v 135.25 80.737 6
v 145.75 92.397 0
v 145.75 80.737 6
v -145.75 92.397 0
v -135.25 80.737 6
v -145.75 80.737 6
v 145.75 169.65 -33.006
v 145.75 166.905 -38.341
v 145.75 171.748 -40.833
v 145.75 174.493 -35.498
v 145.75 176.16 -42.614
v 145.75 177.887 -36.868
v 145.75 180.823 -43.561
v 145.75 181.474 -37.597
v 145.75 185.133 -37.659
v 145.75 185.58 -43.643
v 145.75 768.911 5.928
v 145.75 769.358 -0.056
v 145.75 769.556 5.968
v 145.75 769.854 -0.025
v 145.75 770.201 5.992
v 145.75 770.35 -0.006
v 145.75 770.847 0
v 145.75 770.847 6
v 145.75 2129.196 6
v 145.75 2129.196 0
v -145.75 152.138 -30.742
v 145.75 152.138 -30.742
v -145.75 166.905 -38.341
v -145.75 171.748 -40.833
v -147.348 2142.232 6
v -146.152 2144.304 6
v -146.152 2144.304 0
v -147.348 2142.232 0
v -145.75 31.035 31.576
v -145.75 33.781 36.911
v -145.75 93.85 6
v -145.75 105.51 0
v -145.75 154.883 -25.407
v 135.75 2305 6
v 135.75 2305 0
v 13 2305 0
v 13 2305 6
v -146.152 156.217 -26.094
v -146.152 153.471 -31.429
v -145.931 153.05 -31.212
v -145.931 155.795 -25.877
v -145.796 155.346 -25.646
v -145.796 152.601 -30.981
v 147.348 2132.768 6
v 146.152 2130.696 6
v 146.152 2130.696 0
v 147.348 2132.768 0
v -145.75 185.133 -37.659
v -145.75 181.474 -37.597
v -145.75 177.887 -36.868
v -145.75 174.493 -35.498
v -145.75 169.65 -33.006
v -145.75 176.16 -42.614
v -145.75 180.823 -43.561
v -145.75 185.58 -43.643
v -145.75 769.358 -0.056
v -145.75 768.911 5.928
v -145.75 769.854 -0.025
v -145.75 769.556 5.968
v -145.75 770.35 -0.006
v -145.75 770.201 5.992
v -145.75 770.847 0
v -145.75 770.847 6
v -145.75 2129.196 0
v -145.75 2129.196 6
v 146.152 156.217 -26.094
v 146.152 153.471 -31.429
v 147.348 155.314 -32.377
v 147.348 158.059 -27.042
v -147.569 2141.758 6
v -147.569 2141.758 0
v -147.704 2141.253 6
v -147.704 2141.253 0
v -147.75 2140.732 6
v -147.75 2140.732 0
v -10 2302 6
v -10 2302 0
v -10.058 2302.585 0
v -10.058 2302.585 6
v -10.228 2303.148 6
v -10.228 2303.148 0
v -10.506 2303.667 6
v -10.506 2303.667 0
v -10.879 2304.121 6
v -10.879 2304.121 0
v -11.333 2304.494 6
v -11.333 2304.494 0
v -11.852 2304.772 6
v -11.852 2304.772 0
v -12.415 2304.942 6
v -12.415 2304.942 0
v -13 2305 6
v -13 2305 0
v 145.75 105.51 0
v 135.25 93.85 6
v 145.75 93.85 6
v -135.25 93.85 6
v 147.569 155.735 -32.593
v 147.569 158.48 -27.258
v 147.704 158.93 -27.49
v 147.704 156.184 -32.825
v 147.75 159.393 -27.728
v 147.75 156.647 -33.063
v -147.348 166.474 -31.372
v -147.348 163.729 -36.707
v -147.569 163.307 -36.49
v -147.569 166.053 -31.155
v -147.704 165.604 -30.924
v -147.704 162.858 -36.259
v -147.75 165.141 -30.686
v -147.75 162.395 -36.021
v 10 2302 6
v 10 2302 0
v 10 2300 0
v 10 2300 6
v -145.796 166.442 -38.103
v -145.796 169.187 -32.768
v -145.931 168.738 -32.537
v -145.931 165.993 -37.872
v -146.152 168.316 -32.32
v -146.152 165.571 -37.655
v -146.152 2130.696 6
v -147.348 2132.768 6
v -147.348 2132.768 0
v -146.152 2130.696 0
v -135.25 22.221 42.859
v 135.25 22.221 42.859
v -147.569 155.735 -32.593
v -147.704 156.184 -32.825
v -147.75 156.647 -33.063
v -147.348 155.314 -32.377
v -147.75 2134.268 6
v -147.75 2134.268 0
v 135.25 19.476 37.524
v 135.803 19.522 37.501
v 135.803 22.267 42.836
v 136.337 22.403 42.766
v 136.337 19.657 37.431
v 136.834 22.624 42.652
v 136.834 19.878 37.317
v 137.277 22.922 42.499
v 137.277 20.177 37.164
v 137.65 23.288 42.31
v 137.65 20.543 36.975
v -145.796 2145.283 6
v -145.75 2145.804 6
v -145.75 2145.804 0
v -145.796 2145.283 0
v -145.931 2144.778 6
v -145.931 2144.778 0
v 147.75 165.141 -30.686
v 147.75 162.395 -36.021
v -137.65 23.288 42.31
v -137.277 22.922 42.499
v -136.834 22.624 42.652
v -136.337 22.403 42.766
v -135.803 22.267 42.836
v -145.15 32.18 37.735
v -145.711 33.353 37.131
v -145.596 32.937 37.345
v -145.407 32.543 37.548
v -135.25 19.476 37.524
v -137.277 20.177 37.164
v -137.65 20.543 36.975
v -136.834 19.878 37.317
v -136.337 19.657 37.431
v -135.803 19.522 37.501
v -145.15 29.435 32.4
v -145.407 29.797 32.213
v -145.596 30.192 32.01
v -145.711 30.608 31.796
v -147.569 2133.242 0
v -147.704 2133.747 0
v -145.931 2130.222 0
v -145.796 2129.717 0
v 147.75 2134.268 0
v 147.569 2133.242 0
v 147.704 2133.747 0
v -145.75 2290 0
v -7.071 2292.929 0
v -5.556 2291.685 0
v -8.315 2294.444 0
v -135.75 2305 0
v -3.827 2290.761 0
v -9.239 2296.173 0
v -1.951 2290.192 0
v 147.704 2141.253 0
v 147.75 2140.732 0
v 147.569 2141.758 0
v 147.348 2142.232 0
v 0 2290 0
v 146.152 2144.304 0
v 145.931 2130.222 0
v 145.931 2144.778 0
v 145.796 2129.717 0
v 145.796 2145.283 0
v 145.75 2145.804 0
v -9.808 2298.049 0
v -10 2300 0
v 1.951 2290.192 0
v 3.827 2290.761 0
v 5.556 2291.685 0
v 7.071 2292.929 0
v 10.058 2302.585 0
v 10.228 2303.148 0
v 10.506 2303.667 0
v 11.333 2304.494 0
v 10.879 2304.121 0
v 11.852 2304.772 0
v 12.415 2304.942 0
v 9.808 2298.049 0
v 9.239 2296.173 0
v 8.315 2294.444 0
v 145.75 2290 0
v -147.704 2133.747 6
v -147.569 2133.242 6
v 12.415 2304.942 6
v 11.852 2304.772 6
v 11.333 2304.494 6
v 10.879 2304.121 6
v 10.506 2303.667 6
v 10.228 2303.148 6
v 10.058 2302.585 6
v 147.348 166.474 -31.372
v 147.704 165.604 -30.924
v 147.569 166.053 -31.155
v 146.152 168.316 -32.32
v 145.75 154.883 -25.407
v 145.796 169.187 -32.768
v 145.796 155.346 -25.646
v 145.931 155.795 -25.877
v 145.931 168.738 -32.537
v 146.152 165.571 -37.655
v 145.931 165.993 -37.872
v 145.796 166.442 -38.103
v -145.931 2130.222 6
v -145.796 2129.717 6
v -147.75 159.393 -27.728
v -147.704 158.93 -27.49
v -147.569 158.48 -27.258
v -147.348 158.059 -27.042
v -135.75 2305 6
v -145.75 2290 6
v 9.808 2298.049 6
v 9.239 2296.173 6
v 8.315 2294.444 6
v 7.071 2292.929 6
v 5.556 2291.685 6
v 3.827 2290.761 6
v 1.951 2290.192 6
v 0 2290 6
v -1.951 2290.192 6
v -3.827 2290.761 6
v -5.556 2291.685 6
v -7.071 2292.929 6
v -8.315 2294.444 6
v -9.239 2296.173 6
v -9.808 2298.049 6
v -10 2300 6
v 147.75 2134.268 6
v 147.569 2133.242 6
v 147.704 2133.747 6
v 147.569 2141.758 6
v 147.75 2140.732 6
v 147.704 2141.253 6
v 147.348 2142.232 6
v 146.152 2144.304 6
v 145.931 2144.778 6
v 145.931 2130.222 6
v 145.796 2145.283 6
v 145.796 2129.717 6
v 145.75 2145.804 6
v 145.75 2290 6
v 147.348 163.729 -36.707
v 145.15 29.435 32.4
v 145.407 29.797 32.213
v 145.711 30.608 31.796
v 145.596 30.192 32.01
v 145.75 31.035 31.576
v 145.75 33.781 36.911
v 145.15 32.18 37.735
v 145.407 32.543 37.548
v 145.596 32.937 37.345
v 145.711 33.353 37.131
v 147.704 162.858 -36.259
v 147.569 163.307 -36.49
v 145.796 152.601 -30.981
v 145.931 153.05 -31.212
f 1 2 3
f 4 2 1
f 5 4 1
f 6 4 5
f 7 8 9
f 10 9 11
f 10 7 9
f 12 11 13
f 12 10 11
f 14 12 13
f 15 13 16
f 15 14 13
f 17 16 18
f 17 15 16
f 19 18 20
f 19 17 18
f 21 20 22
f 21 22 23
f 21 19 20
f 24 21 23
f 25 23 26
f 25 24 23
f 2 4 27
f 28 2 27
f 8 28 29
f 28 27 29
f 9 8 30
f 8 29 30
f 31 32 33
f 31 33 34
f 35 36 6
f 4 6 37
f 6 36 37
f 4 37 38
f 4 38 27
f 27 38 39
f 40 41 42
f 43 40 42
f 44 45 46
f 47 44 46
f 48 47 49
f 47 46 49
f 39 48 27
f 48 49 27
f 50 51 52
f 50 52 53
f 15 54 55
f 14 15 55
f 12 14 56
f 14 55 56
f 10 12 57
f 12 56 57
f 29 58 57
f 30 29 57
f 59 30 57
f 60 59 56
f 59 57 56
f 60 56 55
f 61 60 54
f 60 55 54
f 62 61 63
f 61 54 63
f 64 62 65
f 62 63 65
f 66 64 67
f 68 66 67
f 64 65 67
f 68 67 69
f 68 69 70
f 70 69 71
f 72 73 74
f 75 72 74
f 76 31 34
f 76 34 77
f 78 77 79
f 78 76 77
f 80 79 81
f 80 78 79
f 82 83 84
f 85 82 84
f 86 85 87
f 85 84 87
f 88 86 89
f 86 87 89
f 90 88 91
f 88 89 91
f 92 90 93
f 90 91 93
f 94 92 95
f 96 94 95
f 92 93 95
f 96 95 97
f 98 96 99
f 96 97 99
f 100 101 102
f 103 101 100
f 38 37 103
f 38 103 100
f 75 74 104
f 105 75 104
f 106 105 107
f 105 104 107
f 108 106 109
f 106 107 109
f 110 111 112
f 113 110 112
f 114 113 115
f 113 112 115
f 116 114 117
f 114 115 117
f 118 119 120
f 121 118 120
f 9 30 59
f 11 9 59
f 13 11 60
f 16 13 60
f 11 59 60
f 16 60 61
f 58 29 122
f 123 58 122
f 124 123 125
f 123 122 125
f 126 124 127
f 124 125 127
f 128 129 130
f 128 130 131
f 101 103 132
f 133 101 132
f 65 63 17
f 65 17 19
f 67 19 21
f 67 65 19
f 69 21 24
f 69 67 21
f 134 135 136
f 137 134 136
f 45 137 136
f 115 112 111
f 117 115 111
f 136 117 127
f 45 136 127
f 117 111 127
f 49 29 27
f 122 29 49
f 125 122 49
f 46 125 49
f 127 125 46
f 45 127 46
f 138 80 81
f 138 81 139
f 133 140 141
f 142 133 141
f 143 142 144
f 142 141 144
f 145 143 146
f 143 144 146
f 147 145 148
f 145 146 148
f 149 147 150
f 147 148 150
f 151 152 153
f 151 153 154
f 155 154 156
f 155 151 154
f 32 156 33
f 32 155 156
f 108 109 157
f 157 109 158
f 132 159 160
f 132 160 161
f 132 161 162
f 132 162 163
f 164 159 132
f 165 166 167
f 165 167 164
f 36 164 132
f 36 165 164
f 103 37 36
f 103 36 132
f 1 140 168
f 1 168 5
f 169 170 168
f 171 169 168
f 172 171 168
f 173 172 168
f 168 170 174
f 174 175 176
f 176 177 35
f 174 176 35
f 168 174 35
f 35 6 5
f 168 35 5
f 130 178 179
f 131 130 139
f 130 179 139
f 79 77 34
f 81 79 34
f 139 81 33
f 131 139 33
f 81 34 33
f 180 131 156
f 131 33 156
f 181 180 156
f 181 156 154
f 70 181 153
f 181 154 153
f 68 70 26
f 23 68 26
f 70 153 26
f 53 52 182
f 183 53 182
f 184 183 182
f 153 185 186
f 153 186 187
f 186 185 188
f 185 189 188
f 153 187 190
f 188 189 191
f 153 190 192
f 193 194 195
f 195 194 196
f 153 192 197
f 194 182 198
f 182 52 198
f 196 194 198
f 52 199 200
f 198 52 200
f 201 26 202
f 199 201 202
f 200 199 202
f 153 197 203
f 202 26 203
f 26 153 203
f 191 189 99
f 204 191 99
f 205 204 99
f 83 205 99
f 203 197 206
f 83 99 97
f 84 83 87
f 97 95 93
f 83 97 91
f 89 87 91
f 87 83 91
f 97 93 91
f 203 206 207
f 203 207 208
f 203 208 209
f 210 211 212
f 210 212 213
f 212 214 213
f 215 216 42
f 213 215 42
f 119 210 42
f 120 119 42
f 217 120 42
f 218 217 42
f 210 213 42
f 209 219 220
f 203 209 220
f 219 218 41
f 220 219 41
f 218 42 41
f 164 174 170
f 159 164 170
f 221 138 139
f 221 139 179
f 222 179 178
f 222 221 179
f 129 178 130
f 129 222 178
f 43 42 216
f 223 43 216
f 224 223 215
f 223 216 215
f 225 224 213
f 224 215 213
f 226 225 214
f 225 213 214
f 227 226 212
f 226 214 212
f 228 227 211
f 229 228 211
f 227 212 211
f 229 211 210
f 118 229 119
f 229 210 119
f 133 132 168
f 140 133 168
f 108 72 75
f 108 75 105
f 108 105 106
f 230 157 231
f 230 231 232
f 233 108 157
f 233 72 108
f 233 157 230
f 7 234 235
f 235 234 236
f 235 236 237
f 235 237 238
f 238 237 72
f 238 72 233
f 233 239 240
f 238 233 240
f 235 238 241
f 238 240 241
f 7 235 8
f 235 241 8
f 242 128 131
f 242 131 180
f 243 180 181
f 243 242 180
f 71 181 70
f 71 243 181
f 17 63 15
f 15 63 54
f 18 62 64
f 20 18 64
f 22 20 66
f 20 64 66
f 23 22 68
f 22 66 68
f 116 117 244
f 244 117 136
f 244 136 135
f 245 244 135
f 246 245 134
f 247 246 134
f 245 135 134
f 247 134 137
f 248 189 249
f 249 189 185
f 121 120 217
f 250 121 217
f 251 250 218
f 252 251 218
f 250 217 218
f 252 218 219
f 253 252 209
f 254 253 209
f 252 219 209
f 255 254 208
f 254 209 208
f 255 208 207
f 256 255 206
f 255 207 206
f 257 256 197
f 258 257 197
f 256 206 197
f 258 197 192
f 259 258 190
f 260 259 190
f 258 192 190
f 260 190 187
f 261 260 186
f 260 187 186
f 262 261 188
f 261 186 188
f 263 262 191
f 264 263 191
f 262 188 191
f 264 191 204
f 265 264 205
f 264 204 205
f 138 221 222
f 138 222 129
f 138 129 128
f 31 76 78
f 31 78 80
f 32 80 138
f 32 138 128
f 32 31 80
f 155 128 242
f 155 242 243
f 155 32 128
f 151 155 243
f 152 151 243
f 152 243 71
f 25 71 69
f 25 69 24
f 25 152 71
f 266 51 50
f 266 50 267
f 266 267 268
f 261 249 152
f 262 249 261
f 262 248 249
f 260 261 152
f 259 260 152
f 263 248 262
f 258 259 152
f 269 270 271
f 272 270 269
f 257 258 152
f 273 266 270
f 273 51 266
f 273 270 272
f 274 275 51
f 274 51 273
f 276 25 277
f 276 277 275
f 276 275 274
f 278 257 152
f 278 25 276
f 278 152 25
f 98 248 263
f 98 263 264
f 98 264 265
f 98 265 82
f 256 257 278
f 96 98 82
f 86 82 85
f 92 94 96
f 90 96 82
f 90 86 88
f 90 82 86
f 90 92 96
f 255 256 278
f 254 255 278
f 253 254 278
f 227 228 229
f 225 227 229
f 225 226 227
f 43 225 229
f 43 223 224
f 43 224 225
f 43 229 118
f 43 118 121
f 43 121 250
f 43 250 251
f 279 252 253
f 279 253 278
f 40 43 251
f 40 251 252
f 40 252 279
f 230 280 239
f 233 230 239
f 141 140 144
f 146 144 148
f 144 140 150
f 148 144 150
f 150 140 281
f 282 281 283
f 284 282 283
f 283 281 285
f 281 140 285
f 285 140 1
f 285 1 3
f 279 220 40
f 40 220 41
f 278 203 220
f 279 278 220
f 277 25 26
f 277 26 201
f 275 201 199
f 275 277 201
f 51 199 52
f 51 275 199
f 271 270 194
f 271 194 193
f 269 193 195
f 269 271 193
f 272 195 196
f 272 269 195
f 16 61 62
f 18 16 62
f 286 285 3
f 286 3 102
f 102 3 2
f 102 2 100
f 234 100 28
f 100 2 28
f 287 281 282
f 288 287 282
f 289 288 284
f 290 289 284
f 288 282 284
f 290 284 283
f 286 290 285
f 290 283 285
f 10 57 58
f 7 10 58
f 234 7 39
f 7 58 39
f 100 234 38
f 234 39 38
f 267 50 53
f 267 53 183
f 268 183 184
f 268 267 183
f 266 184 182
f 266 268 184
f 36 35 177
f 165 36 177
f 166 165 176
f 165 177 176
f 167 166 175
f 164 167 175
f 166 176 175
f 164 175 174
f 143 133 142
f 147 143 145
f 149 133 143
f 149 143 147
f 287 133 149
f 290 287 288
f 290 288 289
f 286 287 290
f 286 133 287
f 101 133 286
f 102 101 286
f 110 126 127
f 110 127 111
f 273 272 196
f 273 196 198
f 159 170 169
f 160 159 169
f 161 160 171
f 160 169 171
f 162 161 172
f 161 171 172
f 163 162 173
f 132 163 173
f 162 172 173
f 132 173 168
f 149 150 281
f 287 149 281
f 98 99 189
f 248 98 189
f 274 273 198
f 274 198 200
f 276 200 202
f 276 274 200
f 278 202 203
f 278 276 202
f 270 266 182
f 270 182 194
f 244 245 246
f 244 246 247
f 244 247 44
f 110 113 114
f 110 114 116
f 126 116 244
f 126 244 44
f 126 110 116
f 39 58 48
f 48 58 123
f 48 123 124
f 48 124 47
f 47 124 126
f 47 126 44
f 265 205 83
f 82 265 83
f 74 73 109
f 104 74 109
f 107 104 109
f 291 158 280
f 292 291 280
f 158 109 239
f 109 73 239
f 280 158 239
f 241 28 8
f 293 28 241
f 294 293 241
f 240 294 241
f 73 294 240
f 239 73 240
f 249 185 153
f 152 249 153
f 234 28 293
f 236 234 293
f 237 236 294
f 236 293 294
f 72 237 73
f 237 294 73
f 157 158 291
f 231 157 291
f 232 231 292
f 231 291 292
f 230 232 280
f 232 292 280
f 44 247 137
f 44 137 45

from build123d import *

# Parameters (mm, degrees)
EXTRUDE1_DEPTH         = 6
EXTRUDE2_DEPTH         = 6
PROCESS_BENDS1_START   = 42.277322868
PROCESS_BENDS1_DEPTH   = 6
PROCESS_BENDS1_START_2 = -147.75
PROCESS_BENDS1_2_DEPTH = 295.5
PROCESS_BENDS1_START_3 = -135.25
PROCESS_BENDS1_3_DEPTH = 270.5
PROCESS_BENDS1_START_4 = -145.75
PROCESS_BENDS1_4_DEPTH = 291.5
PROCESS_BENDS1_5_DEPTH = 6


with BuildPart() as part:
    # Sketch1 → Extrude1 (new body)
    with BuildSketch(Plane.XY):
        with BuildLine():
            Line((-135.25, 0), (135.25, 0))
            ThreePointArc((135.25, 0), (136.591640787, 0.316718427), (137.65, 1.2))
            Line((137.65, 1.2), (145.15, 11.2))
            ThreePointArc((145.15, 11.2), (145.596049894, 12.051316702), (145.75, 13))
            Line((145.75, 13), (145.75, 2290))
            Line((145.75, 2290), (135.75, 2305))
            Line((135.75, 2305), (13, 2305))
            ThreePointArc((13, 2305), (10.878679656, 2304.121320344), (10, 2302))
            Line((10, 2302), (10, 2300))
            ThreePointArc((10, 2300), (0, 2290), (-10, 2300))
            Line((-10, 2300), (-10, 2302))
            ThreePointArc((-10, 2302), (-10.878679656, 2304.121320344), (-13, 2305))
            Line((-13, 2305), (-135.75, 2305))
            Line((-135.75, 2305), (-145.75, 2290))
            Line((-145.75, 2290), (-145.75, 13))
            ThreePointArc((-145.75, 13), (-145.596049894, 12.051316702), (-145.15, 11.2))
            Line((-145.15, 11.2), (-137.65, 1.2))
            ThreePointArc((-137.65, 1.2), (-136.591640787, 0.316718427), (-135.25, 0))
        make_face()
    extrude(amount=EXTRUDE1_DEPTH)

    # Sketch3 → Extrude2 (add)
    with BuildSketch(Plane.XY.offset(6)):
        with BuildLine():
            Line((147.348076211, 2142.232050808), (146.151923789, 2144.303847577))
            ThreePointArc((146.151923789, 2144.303847577), (145.852222521, 2145.027390442), (145.75, 2145.803847577))
            Line((145.75, 2145.803847577), (145.75, 2129.196152423))
            ThreePointArc((145.75, 2129.196152423), (145.852222521, 2129.972609558), (146.151923789, 2130.696152423))
            Line((146.151923789, 2130.696152423), (147.348076211, 2132.767949192))
            ThreePointArc((147.348076211, 2132.767949192), (147.647777479, 2133.491492057), (147.75, 2134.267949192))
            Line((147.75, 2134.267949192), (147.75, 2140.732050808))
            ThreePointArc((147.75, 2140.732050808), (147.647777479, 2141.508507943), (147.348076211, 2142.232050808))
        make_face()
        with BuildLine():
            Line((-145.75, 2129.196152423), (-145.75, 2145.803847577))
            ThreePointArc((-145.75, 2145.803847577), (-145.852222521, 2145.027390442), (-146.151923789, 2144.303847577))
            Line((-146.151923789, 2144.303847577), (-147.348076211, 2142.232050808))
            ThreePointArc((-147.348076211, 2142.232050808), (-147.647777479, 2141.508507943), (-147.75, 2140.732050808))
            Line((-147.75, 2140.732050808), (-147.75, 2134.267949192))
            ThreePointArc((-147.75, 2134.267949192), (-147.647777479, 2133.491492057), (-147.348076211, 2132.767949192))
            Line((-147.348076211, 2132.767949192), (-146.151923789, 2130.696152423))
            ThreePointArc((-146.151923789, 2130.696152423), (-145.852222521, 2129.972609558), (-145.75, 2129.196152423))
        make_face()
        with BuildLine():
            Line((145.75, 149.196152423), (145.75, 165.803847577))
            ThreePointArc((145.75, 165.803847577), (145.852222521, 165.027390442), (146.151923789, 164.303847577))
            Line((146.151923789, 164.303847577), (147.348076211, 162.232050808))
            ThreePointArc((147.348076211, 162.232050808), (147.647777479, 161.508507943), (147.75, 160.732050808))
            Line((147.75, 160.732050808), (147.75, 154.267949192))
            ThreePointArc((147.75, 154.267949192), (147.647777479, 153.491492057), (147.348076211, 152.767949192))
            Line((147.348076211, 152.767949192), (146.151923789, 150.696152423))
            ThreePointArc((146.151923789, 150.696152423), (145.852222521, 149.972609558), (145.75, 149.196152423))
        make_face()
        with BuildLine():
            Line((-147.348076211, 162.232050808), (-146.151923789, 164.303847577))
            ThreePointArc((-146.151923789, 164.303847577), (-145.852222521, 165.027390442), (-145.75, 165.803847577))
            Line((-145.75, 165.803847577), (-145.75, 149.196152423))
            ThreePointArc((-145.75, 149.196152423), (-145.852222521, 149.972609558), (-146.151923789, 150.696152423))
            Line((-146.151923789, 150.696152423), (-147.348076211, 152.767949192))
            ThreePointArc((-147.348076211, 152.767949192), (-147.647777479, 153.491492057), (-147.75, 154.267949192))
            Line((-147.75, 154.267949192), (-147.75, 160.732050808))
            ThreePointArc((-147.75, 160.732050808), (-147.647777479, 161.508507943), (-147.348076211, 162.232050808))
        make_face()
    extrude(amount=-EXTRUDE2_DEPTH)

    # Process-Bends1 2 outline → Process-Bends1 2 (cut)
    with BuildSketch(Plane.YZ.offset(PROCESS_BENDS1_START_2)):
        Polygon((92.396611983, 0), (80.736895303, 6), (0, 6), (0, 0), align=None)
        with BuildLine():
            Line((770.847206555, 6), (93.849827585, 6))
            Line((93.849827585, 6), (105.509544266, 0))
            Line((105.509544266, 0), (689.517739901, 0))
            Line((689.517739901, 0), (768.911335172, 5.927830646))
            ThreePointArc((768.911335172, 5.927830646), (769.878598478, 5.981951397), (770.847206555, 6))
        make_face()
    extrude(amount=PROCESS_BENDS1_2_DEPTH, mode=Mode.SUBTRACT)

    # Process-Bends1 3 outline → Process-Bends1 3 (add)
    with BuildSketch(Plane.YZ.offset(PROCESS_BENDS1_START_3)):
        Polygon((22.221302391, 42.859484921), (19.475921021, 37.524423428), (80.736895303, 6), (93.849827585, 6), align=None)
        with BuildLine():
            Line((105.509544266, 0), (92.396611983, 0))
            Line((92.396611983, 0), (171.747570561, -40.833389396))
            ThreePointArc((171.747570561, -40.833389396), (178.469550701, -43.194639768), (185.580094549, -43.64262024))
            Line((185.580094549, -43.64262024), (769.358074722, -0.055514888))
            ThreePointArc((769.358074722, -0.055514888), (770.102123419, -0.013883541), (770.847206555, 0))
            Line((770.847206555, 0), (689.517739901, 0))
            Line((689.517739901, 0), (185.133354999, -37.659274706))
            ThreePointArc((185.133354999, -37.659274706), (179.663705885, -37.314674343), (174.492951931, -35.498327904))
            Line((174.492951931, -35.498327904), (105.509544266, 0))
        make_face()
    extrude(amount=PROCESS_BENDS1_3_DEPTH)



with BuildPart() as body_2:
    # Process-Bends1: read off the stored shape, not the designer's step
    # Process-Bends1 outline → Process-Bends1 (new body)
    with BuildSketch(Plane(origin=(0, 0, 0), x_dir=(1, 0, 0), z_dir=(0, 0.457563561703474, 0.889176915468025)).offset(PROCESS_BENDS1_START)):
        with BuildLine():
            ThreePointArc((-145.75, 165.951578122), (-145.852222521, 165.175120987), (-146.151923789, 164.451578122))
            Line((-146.151923789, 164.451578122), (-147.348076211, 162.379781352))
            ThreePointArc((-147.348076211, 162.379781352), (-147.647777479, 161.656238487), (-147.75, 160.879781352))
            Line((-147.75, 160.879781352), (-147.75, 154.415679737))
            ThreePointArc((-147.75, 154.415679737), (-147.647777479, 153.639222602), (-147.348076211, 152.915679737))
            Line((-147.348076211, 152.915679737), (-146.151923789, 150.843882967))
            ThreePointArc((-146.151923789, 150.843882967), (-145.852222521, 150.120340102), (-145.75, 149.343882967))
            Line((-145.75, 149.343882967), (-145.75, 165.951578122))
        make_face()
        with BuildLine():
            Line((145.75, 165.951578122), (145.75, 149.343882967))
            ThreePointArc((145.75, 149.343882967), (145.852222521, 150.120340102), (146.151923789, 150.843882967))
            Line((146.151923789, 150.843882967), (147.348076211, 152.915679737))
            ThreePointArc((147.348076211, 152.915679737), (147.647777479, 153.639222602), (147.75, 154.415679737))
            Line((147.75, 154.415679737), (147.75, 160.879781352))
            ThreePointArc((147.75, 160.879781352), (147.647777479, 161.656238487), (147.348076211, 162.379781352))
            Line((147.348076211, 162.379781352), (146.151923789, 164.451578122))
            ThreePointArc((146.151923789, 164.451578122), (145.852222521, 165.175120987), (145.75, 165.951578122))
        make_face()
    extrude(amount=PROCESS_BENDS1_DEPTH)


with BuildPart() as part_1:
    add(part.part)

    add(body_2.part)  # Process-Bends1 4 merges body 2
    # Process-Bends1 4 outline → Process-Bends1 4 (add)
    with BuildSketch(Plane.YZ.offset(PROCESS_BENDS1_START_4)):
        with BuildLine():
            Line((105.509544266, 0), (92.396611983, 0))
            Line((92.396611983, 0), (171.747570561, -40.833389396))
            ThreePointArc((171.747570561, -40.833389396), (178.469550701, -43.194639768), (185.580094549, -43.64262024))
            Line((185.580094549, -43.64262024), (769.358074722, -0.055514888))
            ThreePointArc((769.358074722, -0.055514888), (770.102123419, -0.013883541), (770.847206555, 0))
            Line((770.847206555, 0), (689.517739901, 0))
            Line((689.517739901, 0), (185.133354999, -37.659274706))
            ThreePointArc((185.133354999, -37.659274706), (179.663705885, -37.314674343), (174.492951931, -35.498327904))
            Line((174.492951931, -35.498327904), (105.509544266, 0))
        make_face()
    extrude(amount=PROCESS_BENDS1_4_DEPTH)

    # Process-Bends1 5 outline → Process-Bends1 5 (add)
    with BuildSketch(Plane(origin=(0, 0, 0), x_dir=(1, 0, 0), z_dir=(0, 0.457563561703474, 0.889176915468025)).offset(PROCESS_BENDS1_START)):
        with BuildLine():
            Line((-145.75, 82), (-145.75, 13.147730544))
            ThreePointArc((-145.75, 13.147730544), (-145.596049894, 12.199047246), (-145.15, 11.347730544))
            Line((-145.15, 11.347730544), (-137.65, 1.347730544))
            ThreePointArc((-137.65, 1.347730544), (-136.591640786, 0.464448971), (-135.25, 0.147730544))
            Line((-135.25, 0.147730544), (-135.25, 82))
            Line((-135.25, 82), (-145.75, 82))
        make_face()
        with BuildLine():
            Line((145.75, 82), (135.25, 82))
            Line((135.25, 82), (135.25, 0.147730544))
            ThreePointArc((135.25, 0.147730544), (136.591640786, 0.464448971), (137.65, 1.347730544))
            Line((137.65, 1.347730544), (145.15, 11.347730544))
            ThreePointArc((145.15, 11.347730544), (145.596049894, 12.199047246), (145.75, 13.147730544))
            Line((145.75, 13.147730544), (145.75, 82))
        make_face()
    extrude(amount=PROCESS_BENDS1_5_DEPTH)


solid = part_1.part
